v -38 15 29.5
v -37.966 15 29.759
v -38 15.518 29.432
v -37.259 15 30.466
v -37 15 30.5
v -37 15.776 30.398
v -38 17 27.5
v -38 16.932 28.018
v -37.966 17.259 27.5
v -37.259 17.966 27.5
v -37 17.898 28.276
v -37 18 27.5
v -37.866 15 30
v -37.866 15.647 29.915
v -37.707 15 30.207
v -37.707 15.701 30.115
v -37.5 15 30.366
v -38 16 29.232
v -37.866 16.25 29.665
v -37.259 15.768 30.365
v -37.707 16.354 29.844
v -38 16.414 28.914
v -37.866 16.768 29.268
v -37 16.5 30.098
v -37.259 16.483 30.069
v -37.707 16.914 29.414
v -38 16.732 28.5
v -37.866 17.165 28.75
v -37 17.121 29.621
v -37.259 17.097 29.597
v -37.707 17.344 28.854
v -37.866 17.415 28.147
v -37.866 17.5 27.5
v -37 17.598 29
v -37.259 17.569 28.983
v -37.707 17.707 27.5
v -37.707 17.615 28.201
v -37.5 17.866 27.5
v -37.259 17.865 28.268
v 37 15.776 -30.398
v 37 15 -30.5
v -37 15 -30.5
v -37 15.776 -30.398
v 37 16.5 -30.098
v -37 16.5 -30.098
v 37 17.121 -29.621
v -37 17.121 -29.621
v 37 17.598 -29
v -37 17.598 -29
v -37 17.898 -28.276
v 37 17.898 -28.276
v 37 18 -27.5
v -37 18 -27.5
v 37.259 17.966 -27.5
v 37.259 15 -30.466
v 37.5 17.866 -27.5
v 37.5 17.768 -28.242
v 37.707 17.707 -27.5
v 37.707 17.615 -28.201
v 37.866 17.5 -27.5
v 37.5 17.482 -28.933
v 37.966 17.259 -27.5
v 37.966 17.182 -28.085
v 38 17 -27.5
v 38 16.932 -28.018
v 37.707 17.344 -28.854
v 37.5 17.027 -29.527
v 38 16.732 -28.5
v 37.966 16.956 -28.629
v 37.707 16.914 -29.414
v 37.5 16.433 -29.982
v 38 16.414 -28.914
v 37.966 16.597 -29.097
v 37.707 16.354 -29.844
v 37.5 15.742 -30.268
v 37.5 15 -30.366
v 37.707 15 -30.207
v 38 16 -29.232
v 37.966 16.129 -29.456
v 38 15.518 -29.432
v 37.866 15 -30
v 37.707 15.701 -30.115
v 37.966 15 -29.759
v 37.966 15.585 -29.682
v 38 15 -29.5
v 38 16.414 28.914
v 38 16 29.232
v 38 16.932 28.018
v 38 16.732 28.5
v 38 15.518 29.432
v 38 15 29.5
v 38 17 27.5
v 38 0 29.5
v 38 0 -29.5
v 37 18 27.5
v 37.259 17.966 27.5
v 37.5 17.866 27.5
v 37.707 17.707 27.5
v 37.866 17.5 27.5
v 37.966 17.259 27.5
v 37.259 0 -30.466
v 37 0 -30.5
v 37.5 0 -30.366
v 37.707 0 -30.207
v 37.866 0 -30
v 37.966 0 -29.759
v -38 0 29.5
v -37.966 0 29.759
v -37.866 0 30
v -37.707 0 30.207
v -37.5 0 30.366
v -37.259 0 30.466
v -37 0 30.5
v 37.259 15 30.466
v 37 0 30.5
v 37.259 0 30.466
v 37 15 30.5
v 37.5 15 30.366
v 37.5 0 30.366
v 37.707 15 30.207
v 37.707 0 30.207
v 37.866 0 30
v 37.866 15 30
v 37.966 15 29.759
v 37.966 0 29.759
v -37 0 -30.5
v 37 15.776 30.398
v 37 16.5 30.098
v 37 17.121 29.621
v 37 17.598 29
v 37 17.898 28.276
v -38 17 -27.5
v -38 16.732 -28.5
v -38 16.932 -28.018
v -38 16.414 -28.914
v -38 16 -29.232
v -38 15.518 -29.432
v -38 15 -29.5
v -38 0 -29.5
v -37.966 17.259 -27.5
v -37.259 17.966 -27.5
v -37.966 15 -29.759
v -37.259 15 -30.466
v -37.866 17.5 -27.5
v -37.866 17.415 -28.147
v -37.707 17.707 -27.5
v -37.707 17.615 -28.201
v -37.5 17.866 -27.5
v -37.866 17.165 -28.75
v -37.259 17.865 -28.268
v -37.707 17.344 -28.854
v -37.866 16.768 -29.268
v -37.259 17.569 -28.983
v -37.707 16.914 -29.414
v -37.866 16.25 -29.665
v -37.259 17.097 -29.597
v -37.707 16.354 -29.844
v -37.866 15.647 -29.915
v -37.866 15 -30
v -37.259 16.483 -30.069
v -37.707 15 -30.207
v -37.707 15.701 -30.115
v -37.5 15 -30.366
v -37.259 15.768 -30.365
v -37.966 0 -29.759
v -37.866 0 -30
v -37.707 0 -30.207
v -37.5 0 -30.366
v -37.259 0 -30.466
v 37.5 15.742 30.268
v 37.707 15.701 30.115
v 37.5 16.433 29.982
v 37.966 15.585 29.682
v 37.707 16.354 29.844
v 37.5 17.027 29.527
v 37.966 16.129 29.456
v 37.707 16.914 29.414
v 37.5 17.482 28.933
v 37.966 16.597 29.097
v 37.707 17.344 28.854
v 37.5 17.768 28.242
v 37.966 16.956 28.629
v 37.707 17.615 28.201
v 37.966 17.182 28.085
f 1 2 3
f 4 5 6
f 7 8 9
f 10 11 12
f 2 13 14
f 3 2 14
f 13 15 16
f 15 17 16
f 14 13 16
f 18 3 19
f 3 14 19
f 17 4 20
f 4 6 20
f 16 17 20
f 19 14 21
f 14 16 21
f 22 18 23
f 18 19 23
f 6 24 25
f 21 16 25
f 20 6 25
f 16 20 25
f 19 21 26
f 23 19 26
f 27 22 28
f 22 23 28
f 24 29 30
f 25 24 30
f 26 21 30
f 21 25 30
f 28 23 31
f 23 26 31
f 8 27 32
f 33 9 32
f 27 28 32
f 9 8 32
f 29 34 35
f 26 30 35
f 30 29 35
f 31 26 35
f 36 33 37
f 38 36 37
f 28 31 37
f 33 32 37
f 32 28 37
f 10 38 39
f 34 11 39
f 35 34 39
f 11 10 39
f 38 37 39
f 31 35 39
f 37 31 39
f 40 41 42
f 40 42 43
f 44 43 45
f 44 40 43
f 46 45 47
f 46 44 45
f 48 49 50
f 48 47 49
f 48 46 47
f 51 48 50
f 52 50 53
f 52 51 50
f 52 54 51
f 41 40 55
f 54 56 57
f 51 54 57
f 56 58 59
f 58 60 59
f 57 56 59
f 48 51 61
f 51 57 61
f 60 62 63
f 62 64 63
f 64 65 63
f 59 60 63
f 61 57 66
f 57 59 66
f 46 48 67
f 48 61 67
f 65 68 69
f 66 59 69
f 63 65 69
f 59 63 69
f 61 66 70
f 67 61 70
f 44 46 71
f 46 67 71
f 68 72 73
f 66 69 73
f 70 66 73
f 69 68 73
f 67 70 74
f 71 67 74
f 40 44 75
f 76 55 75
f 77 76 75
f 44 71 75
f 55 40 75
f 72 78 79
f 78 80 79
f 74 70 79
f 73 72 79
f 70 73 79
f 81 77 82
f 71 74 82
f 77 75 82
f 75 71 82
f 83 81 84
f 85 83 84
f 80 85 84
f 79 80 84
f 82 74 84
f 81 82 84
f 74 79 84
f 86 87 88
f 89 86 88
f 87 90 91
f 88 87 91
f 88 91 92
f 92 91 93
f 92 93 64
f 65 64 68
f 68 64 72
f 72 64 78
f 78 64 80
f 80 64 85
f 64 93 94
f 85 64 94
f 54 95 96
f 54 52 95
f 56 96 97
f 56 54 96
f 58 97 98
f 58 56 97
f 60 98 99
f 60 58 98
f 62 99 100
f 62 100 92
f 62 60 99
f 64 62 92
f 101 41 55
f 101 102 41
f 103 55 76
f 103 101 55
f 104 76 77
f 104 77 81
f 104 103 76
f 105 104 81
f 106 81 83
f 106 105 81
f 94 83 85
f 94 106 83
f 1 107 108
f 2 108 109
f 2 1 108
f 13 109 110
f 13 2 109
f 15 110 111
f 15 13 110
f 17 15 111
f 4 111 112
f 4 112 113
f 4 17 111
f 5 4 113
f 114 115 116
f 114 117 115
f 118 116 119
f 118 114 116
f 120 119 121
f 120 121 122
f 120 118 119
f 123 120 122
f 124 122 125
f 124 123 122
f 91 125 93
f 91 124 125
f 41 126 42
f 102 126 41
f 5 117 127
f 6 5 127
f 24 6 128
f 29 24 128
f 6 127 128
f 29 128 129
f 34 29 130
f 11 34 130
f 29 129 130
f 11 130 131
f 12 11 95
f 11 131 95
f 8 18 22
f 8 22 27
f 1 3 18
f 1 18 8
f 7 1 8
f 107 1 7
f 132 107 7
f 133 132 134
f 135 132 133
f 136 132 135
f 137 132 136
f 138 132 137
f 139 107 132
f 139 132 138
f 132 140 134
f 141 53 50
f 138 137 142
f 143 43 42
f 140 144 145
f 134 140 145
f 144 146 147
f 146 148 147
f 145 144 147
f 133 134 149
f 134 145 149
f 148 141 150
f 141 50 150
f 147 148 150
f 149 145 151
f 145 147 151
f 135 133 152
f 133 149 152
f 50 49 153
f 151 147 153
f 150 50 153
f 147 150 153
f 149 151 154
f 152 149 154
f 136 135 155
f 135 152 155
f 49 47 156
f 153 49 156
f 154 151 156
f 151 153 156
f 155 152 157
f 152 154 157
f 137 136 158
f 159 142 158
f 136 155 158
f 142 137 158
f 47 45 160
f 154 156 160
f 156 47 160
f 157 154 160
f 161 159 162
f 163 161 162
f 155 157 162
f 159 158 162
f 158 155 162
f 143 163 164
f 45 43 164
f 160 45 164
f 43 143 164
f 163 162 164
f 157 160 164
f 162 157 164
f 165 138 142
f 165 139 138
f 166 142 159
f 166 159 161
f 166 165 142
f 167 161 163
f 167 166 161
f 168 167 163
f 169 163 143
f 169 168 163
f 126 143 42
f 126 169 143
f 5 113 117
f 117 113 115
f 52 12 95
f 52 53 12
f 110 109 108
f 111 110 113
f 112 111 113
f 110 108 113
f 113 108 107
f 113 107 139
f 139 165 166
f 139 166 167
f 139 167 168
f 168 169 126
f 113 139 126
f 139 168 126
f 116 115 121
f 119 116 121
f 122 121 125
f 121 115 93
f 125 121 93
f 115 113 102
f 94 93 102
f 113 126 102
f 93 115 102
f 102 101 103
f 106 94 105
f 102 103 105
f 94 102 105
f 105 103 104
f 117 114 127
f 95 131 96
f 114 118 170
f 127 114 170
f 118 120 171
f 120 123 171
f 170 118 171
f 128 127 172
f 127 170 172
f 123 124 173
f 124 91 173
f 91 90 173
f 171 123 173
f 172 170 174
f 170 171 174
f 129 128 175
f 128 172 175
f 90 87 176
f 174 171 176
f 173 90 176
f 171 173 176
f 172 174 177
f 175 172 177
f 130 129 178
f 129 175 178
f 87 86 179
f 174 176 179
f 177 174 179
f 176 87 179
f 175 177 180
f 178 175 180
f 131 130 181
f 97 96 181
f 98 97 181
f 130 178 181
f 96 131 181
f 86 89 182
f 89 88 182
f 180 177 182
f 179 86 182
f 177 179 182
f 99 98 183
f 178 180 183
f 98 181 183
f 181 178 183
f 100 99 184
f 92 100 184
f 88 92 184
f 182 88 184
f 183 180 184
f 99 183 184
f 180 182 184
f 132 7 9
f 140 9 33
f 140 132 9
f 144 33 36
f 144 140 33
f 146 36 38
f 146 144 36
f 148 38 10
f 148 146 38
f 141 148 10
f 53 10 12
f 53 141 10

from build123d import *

# Parameters (mm, degrees)
SKETCH_1_W      = 76
SKETCH_1_H      = 61
EXTRUDE_1_DEPTH = 18
FILLET_1_R      = 3
FILLET_2_R      = 1


with BuildPart() as part:
    # 草圖1 → 填料-伸長1 (new body)
    with BuildSketch(Plane(origin=(0, 0, 0), x_dir=(1, 0, 0), z_dir=(0, 1, 0))):
        Rectangle(SKETCH_1_W, SKETCH_1_H)
    extrude(amount=EXTRUDE_1_DEPTH)

    # 圓角1
    fillet_1_edges = [part.edges().sort_by_distance(p)[0] for p in [
        (0, 18, 30.5),
        (0, 18, -30.5),
    ]]
    fillet(fillet_1_edges, radius=FILLET_1_R)

    # 圓角2
    fillet_2_edges = [part.edges().sort_by_distance(p)[0] for p in [
        (38, 18, 0),
        (-38, 18, 0),
        (38, 7.5, -30.5),
        (38, 7.5, 30.5),
        (38, 17.121320344, -29.621320344),
        (38, 17.121320344, 29.621320344),
        (-38, 7.5, 30.5),
        (-38, 7.5, -30.5),
        (-38, 17.121320344, -29.621320344),
        (-38, 17.121320344, 29.621320344),
    ]]
    fillet(fillet_2_edges, radius=FILLET_2_R)


solid = part.part
